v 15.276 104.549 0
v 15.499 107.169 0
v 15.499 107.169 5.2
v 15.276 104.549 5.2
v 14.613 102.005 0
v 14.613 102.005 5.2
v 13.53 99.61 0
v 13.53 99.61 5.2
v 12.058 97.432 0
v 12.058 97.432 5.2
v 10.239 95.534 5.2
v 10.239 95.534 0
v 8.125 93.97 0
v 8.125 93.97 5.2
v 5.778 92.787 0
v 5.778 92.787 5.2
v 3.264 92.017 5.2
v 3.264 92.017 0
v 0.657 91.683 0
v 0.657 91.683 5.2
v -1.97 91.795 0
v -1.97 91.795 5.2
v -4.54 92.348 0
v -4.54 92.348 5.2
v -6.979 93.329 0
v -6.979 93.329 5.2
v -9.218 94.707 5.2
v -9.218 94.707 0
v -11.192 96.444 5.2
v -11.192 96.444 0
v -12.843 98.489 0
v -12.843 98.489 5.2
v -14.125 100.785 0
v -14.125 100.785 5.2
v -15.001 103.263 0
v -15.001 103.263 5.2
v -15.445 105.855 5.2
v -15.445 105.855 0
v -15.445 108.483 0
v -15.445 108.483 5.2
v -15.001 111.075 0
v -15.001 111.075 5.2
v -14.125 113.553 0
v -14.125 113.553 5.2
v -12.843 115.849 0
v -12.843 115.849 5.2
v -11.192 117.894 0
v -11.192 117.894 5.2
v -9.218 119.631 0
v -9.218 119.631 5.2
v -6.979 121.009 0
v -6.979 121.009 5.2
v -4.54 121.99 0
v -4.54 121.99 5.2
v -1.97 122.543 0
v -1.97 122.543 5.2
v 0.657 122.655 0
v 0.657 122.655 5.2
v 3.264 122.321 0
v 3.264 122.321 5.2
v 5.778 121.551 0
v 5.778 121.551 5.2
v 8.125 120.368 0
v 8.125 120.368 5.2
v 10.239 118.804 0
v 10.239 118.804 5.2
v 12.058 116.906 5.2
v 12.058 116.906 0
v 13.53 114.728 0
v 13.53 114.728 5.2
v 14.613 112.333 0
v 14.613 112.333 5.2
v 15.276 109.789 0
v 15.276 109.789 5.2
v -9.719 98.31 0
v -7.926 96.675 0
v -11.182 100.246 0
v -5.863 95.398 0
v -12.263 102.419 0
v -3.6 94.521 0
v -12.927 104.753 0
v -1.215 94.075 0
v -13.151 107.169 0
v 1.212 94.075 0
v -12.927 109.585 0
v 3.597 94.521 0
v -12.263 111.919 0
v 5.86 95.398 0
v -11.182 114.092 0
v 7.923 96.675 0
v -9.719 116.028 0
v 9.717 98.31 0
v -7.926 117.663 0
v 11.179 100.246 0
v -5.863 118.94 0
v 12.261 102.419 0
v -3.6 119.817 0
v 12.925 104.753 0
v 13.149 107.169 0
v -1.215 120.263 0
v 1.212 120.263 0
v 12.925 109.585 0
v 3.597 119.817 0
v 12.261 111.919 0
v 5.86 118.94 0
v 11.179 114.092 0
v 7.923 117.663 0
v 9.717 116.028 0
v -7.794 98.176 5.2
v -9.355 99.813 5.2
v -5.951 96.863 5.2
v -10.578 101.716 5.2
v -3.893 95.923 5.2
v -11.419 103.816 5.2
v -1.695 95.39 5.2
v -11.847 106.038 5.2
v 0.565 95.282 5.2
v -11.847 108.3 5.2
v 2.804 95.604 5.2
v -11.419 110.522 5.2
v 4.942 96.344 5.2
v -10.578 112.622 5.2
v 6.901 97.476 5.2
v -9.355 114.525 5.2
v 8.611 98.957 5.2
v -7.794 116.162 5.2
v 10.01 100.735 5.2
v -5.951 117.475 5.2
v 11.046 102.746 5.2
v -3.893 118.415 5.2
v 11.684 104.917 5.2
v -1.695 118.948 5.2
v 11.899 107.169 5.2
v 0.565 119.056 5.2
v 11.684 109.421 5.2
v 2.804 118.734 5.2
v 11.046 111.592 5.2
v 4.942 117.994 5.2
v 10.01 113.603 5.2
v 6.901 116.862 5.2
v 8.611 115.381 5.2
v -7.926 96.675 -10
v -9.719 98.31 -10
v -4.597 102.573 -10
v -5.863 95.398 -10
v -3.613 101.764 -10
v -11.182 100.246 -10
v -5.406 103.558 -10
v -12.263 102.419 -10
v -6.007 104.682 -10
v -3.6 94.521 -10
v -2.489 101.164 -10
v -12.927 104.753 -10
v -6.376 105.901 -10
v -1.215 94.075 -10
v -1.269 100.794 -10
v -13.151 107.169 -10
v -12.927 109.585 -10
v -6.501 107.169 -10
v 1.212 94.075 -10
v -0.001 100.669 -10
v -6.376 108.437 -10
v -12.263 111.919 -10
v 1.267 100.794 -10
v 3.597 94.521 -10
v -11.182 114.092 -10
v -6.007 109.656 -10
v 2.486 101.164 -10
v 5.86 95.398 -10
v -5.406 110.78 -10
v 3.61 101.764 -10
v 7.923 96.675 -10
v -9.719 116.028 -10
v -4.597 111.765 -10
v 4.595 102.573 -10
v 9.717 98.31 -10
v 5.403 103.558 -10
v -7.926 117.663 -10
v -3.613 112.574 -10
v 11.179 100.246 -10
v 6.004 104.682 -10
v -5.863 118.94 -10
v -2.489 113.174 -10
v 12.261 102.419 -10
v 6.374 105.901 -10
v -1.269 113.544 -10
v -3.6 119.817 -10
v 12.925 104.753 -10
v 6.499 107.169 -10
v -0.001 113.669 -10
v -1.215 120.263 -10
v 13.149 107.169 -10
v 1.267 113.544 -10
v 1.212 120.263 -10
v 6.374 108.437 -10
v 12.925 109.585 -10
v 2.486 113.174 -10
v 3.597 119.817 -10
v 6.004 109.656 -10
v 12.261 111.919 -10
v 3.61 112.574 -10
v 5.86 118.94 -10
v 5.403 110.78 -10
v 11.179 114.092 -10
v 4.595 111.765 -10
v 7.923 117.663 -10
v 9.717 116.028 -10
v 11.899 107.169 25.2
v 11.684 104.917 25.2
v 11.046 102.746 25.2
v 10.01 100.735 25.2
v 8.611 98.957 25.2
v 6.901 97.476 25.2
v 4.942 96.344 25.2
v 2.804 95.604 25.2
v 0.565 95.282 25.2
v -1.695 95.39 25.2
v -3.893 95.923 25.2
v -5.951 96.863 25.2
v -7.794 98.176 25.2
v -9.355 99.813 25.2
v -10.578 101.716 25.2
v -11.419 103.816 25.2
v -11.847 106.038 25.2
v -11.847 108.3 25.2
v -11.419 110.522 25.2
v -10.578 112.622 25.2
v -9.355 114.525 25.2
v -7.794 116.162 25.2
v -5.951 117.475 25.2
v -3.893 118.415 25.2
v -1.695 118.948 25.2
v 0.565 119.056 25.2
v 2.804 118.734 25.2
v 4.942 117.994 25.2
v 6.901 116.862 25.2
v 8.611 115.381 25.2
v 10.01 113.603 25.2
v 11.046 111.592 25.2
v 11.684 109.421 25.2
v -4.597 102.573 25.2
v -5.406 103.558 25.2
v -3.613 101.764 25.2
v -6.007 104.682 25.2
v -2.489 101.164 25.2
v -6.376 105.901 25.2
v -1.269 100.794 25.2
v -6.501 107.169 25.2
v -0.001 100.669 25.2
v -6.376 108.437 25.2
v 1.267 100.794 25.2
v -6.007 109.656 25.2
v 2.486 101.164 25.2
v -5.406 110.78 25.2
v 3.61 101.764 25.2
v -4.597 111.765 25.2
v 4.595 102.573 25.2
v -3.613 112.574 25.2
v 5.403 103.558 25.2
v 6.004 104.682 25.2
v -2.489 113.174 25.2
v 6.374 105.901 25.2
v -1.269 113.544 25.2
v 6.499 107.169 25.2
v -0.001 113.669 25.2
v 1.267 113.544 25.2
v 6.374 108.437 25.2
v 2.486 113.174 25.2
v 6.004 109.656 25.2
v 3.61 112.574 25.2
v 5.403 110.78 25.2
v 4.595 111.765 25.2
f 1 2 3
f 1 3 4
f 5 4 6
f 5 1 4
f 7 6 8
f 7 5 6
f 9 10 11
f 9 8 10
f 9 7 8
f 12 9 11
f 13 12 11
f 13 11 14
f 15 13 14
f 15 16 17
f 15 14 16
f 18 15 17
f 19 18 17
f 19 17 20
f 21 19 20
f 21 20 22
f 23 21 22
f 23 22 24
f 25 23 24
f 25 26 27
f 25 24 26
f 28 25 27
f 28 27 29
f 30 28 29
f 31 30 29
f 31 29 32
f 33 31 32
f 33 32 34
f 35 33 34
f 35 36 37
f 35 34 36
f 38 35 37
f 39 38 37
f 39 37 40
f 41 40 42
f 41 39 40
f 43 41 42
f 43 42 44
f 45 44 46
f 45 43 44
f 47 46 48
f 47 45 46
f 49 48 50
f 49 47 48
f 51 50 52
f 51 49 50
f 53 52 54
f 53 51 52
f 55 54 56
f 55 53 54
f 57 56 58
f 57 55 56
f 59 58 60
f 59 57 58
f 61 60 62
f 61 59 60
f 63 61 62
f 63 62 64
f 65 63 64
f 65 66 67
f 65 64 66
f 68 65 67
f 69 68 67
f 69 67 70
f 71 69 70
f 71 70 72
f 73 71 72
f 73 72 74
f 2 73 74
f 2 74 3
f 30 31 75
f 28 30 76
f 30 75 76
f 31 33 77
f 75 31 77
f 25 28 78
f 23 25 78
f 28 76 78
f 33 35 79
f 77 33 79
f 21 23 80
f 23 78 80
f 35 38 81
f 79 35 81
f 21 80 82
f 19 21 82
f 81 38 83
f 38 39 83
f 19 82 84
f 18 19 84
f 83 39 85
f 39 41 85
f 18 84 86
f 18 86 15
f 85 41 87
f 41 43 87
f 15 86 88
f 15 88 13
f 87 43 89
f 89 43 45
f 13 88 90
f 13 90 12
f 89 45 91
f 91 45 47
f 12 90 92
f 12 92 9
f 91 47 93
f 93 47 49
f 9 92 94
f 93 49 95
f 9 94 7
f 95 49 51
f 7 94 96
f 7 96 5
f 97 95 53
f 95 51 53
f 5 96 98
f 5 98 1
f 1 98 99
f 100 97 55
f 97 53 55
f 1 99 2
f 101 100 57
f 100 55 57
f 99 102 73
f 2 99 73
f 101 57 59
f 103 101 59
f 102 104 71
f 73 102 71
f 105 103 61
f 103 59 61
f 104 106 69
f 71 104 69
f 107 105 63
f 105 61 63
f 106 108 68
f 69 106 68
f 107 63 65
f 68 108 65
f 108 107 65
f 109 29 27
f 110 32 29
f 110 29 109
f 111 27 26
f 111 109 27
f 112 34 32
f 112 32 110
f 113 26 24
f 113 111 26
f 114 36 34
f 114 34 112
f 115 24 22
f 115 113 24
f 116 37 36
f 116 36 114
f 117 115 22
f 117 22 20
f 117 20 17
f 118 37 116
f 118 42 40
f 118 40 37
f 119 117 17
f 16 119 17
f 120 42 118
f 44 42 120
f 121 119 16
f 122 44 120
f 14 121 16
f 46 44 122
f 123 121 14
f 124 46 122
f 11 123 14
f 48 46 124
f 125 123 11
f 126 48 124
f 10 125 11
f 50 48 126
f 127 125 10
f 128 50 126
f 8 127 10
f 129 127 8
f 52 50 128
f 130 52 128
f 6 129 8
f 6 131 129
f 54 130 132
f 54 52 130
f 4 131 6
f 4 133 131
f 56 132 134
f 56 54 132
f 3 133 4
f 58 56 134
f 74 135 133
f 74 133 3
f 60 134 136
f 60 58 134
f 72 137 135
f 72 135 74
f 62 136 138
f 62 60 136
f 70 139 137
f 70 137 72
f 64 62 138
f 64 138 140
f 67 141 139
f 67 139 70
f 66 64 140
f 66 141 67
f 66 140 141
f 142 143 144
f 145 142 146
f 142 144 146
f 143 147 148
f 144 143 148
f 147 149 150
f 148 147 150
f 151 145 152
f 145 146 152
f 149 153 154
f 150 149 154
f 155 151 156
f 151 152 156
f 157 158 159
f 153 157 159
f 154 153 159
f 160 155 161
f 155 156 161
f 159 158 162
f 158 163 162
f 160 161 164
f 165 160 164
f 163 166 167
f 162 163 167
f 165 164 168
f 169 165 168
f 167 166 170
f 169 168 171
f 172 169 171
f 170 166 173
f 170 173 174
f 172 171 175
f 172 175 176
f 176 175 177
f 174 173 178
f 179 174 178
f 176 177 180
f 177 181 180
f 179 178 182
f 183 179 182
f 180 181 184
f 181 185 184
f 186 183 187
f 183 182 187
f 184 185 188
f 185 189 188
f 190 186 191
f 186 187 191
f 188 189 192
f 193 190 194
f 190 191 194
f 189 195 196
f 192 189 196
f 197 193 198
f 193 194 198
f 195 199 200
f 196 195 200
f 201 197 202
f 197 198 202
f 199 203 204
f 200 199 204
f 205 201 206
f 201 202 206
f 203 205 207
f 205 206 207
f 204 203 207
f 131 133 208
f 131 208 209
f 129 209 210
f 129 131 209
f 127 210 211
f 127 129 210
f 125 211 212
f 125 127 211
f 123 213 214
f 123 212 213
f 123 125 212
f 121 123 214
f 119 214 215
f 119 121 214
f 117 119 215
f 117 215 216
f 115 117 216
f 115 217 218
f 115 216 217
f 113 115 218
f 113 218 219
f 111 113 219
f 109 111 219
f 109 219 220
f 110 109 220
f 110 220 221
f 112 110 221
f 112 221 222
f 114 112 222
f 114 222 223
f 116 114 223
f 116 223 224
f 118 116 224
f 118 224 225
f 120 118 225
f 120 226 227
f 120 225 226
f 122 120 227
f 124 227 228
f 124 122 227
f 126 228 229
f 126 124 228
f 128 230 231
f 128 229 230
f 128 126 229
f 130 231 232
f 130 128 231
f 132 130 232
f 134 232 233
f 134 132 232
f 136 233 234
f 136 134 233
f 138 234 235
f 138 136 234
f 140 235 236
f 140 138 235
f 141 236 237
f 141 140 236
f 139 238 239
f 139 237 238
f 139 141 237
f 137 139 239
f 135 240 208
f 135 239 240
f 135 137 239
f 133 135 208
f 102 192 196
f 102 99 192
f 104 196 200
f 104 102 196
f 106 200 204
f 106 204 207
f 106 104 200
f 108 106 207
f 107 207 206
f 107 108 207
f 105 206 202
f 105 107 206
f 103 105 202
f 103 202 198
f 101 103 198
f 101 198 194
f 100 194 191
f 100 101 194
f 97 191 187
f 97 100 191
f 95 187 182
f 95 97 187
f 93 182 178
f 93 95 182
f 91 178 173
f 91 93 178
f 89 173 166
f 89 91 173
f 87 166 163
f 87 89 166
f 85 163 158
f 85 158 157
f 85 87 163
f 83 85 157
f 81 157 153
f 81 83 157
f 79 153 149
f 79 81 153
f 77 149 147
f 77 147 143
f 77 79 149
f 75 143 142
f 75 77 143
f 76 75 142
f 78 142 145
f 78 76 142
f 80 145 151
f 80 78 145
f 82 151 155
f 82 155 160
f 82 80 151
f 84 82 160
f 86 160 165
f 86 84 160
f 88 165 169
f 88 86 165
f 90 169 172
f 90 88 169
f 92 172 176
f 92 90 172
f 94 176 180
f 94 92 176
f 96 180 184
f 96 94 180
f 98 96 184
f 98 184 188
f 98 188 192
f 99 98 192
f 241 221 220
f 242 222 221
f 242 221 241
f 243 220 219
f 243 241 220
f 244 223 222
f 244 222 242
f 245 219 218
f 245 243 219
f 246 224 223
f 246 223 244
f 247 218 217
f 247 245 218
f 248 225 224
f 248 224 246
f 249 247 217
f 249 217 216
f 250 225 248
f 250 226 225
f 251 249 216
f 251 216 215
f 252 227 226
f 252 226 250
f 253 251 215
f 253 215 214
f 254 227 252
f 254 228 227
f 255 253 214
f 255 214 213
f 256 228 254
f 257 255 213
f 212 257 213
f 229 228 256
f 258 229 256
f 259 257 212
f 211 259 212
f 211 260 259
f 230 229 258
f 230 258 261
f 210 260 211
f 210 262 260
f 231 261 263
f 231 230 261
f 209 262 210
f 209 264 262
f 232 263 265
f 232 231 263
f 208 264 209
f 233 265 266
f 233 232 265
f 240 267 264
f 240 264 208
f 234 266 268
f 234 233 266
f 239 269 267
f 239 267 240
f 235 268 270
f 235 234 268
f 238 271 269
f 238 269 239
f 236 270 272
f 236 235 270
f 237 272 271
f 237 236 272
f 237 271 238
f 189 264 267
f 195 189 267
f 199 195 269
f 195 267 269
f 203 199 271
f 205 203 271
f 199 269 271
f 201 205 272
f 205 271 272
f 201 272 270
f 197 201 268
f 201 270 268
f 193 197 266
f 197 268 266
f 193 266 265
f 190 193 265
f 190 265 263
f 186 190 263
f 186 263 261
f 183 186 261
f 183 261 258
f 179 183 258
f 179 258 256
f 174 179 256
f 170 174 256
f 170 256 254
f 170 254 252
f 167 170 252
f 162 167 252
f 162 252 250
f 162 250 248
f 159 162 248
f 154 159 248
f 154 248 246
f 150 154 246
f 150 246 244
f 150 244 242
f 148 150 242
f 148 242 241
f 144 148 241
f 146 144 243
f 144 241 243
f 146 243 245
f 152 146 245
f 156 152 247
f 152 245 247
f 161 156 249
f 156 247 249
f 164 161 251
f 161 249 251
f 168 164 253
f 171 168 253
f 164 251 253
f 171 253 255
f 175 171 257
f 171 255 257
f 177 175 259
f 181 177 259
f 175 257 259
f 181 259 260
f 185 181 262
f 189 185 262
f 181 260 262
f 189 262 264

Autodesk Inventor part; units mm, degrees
ref_plane "YZ Plane" through (0, 0, 0) normal (1, 0, 0) x (0, 1, 0)
ref_plane "XZ Plane" through (0, 0, 0) normal (0, 1, 0) x (-1, 0, 0)
ref_plane "XY Plane" through (0, 0, 0) normal (0, 0, 1) x (1, 0, 0)
ref_plane "РабПлоскость1" through (0, 0, 0) normal (0, 0, 1) x (1, 0, 0)
sketch "Эскиз1" plane through (0, 0, 0) normal (0, 0, 1) x (1, 0, 0)
  circle A0 centre (-0.0013, 107.169) radius 13.15
  circle A1 centre (-0.0025, 107.6908) radius 11.9 projected
  point P0 (0, 0)
extrude "Выдавливание1" add sketch "Эскиз1" against normal blind 10 contours A0 | A1
sketch "Эскиз2" plane through (-0.0013, 107.169, 0) normal (0, 0, 1) x (1, 0, 0)
  circle A0 centre (0, 0) radius 15.5
  point P0 (0.0013, -107.169)
  dimension "d2" = 31
extrude "Выдавливание2" add sketch "Эскиз2" along normal blind 5.2
sketch "Эскиз3" plane through (-0.0013, 107.169, 5.2) normal (0, 0, 1) x (1, 0, 0)
  circle A0 centre (0, 0) radius 11.9
  point P0 (0.0013, -107.169)
  dimension "d5" = 23.8
extrude "Выдавливание3" add sketch "Эскиз3" along normal blind 20
sketch "Эскиз4" plane through (-0.0013, 107.169, 25.2) normal (0, 0, 1) x (1, 0, 0)
  circle A0 centre (0, 0) radius 6.5
  point P0 (0.0013, -107.169)
  dimension "d8" = 13
extrude "Выдавливание4" cut sketch "Эскиз4" against normal up to next
properties part number "Ось"
